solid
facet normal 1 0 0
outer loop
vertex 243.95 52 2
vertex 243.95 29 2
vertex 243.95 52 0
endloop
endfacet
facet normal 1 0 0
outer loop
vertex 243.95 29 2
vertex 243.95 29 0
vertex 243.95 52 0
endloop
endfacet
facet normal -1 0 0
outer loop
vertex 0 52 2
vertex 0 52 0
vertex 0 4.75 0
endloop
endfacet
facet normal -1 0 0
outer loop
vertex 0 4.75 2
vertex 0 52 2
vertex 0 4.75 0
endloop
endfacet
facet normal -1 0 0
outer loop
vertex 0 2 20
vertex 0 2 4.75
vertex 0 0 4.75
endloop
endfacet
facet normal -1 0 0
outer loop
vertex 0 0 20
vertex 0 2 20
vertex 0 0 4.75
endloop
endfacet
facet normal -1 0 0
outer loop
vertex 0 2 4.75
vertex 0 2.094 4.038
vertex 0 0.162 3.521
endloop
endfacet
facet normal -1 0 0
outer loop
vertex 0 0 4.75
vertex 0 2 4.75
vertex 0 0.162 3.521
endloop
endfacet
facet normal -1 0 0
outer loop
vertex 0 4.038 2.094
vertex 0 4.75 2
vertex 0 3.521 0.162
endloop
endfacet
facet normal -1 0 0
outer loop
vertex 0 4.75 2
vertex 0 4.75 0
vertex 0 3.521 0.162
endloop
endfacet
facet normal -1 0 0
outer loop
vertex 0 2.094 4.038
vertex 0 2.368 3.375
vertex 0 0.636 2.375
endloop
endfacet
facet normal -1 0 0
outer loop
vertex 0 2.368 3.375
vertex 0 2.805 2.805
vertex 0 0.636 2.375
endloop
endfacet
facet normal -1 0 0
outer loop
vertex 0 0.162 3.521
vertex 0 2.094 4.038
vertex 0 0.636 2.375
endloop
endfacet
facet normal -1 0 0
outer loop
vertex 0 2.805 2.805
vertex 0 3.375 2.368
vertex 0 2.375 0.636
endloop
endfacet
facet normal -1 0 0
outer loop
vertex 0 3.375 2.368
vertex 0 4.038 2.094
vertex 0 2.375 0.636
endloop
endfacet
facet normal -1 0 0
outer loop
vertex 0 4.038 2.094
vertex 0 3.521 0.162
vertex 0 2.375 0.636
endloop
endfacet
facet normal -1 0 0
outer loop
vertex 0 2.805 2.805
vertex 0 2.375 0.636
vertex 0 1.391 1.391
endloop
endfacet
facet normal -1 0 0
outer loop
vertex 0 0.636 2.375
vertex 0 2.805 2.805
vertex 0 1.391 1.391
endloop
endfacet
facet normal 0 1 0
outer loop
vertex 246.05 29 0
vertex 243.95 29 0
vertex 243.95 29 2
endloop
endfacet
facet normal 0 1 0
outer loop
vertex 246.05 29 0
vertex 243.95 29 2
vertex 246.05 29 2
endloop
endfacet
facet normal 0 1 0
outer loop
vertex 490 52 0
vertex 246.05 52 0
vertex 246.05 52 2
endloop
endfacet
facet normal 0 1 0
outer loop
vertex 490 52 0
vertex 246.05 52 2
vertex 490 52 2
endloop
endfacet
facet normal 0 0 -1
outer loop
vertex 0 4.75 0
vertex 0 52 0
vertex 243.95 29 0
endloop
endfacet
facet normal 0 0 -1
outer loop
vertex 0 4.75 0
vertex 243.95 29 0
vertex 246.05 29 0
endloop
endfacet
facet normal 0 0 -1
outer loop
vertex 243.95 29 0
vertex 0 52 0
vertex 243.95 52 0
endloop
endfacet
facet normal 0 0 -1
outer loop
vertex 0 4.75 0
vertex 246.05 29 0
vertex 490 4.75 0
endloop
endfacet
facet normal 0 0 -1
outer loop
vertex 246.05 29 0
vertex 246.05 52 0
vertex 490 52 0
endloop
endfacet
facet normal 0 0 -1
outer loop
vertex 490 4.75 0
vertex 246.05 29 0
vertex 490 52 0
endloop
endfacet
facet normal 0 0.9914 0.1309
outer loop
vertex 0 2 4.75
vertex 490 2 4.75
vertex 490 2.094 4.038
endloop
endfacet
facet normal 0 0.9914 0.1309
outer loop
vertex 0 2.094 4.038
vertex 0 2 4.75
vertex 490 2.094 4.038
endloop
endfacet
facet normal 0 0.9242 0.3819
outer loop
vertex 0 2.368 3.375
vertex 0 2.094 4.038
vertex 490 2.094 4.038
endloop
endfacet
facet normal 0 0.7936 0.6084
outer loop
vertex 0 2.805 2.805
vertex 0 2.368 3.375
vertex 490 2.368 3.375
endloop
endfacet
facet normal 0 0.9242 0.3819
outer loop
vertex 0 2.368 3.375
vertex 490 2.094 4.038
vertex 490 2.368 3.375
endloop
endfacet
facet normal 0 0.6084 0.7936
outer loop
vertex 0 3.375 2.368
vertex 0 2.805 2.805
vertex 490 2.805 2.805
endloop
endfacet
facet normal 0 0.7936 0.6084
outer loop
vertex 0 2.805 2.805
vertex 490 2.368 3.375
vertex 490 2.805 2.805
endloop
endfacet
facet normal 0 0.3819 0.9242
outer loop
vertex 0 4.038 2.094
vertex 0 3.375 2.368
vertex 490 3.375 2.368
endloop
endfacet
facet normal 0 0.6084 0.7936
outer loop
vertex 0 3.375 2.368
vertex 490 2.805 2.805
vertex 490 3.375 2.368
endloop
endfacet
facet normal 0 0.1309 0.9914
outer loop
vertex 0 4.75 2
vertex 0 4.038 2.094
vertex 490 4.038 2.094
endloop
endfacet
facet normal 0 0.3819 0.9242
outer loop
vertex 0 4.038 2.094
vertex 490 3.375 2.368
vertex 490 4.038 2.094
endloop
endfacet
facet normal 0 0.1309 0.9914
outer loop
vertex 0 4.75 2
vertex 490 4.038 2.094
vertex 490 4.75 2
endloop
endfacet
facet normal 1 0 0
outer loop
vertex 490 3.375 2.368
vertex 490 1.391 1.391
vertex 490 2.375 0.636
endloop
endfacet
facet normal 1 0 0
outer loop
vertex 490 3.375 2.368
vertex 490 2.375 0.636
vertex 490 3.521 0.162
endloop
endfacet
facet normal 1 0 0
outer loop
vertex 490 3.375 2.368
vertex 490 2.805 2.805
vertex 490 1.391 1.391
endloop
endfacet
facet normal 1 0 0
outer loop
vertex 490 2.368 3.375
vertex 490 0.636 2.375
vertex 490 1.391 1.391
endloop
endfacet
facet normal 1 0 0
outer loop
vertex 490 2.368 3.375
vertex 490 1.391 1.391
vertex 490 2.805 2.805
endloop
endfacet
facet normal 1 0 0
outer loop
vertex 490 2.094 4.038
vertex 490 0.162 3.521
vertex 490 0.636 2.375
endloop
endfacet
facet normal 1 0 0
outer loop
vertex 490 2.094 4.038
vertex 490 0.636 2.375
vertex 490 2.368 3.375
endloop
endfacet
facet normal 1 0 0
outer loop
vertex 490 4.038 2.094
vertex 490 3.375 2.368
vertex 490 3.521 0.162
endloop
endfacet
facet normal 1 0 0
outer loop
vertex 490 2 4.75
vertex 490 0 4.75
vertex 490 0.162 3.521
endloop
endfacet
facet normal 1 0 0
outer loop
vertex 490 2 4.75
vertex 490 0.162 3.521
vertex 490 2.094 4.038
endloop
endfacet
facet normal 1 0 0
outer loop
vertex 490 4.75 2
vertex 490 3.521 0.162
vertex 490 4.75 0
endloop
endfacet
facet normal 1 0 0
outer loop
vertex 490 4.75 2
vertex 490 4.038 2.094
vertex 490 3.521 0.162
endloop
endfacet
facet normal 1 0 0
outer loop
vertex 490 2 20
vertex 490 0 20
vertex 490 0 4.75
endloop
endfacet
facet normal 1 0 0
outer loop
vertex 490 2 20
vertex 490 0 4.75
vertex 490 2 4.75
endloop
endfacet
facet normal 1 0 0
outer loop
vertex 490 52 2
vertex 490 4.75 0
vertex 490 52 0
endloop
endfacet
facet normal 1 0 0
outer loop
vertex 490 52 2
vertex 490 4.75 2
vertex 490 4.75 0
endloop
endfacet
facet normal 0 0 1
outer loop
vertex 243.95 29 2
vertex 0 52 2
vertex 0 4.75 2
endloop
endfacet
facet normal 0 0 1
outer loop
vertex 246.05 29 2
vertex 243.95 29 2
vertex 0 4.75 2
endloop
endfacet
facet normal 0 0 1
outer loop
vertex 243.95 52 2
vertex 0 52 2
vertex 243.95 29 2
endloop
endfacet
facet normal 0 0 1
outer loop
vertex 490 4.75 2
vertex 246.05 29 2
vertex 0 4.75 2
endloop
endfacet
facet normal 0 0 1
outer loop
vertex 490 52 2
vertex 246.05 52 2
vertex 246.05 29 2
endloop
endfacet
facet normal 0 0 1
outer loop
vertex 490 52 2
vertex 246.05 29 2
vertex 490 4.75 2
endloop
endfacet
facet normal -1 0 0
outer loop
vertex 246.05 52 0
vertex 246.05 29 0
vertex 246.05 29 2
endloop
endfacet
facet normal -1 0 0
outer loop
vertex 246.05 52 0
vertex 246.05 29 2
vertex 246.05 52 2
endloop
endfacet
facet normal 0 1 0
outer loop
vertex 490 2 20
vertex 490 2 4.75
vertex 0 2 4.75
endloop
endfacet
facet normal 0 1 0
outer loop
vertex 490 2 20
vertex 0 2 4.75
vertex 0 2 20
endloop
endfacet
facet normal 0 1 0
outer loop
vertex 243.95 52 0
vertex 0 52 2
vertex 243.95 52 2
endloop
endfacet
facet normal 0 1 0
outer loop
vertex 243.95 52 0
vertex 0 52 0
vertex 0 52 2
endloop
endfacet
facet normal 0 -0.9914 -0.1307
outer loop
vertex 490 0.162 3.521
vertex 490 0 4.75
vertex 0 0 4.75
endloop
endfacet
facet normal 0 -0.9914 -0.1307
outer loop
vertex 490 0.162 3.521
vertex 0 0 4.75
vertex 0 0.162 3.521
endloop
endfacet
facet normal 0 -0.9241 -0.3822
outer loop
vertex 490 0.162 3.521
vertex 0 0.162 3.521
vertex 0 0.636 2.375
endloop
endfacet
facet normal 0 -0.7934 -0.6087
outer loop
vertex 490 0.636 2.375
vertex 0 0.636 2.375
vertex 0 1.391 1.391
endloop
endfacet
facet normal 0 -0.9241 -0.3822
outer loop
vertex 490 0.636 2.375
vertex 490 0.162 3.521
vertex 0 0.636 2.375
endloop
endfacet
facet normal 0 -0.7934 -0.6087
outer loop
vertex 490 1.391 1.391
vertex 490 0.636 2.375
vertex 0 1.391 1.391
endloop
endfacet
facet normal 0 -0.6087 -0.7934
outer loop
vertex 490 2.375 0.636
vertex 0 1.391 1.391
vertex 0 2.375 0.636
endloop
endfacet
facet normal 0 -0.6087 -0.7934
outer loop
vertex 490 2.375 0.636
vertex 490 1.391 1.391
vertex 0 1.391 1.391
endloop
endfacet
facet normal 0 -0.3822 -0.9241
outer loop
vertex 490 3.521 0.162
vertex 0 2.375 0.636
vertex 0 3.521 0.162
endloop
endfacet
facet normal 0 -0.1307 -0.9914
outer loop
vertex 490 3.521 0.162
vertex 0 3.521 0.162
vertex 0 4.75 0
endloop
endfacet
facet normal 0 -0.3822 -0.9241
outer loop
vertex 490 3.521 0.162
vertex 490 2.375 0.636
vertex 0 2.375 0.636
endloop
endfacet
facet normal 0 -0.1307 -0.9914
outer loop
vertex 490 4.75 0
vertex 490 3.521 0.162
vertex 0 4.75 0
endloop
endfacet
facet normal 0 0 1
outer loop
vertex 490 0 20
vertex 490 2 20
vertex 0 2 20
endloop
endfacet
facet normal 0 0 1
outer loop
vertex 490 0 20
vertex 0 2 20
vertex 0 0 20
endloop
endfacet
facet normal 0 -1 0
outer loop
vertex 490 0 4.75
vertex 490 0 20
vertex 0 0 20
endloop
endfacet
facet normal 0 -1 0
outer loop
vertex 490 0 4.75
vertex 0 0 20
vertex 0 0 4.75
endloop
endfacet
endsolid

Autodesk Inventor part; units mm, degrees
ref_plane "YZ Plane" through (0, 0, 0) normal (1, 0, 0) x (0, 1, 0)
ref_plane "XZ Plane" through (0, 0, 0) normal (0, 1, 0) x (-1, 0, 0)
ref_plane "XY Plane" through (0, 0, 0) normal (0, 0, 1) x (1, 0, 0)
sketch "Sketch1" plane through (0, 0, 0) normal (0, 0, 1) x (1, 0, 0)
  line L0 (-490, 52) -> (490, 52)
  line L1 (490, 52) -> (490, 0)
  line L2 (490, 0) -> (-490, 0)
  line L3 (-490, 0) -> (-490, 52)
  point P0 (0, 0)
  point P1 (0, 0)
  dimension "d0" = 980
  dimension "d1" = 52
extrude "Plate1" add sketch "Sketch1" along normal blind 2
sketch "Sketch2" plane through (490, 2, 0) normal (0, -1, 0) x (1, 0, 0)
  line L0 (-980, 0) -> (0, 0)
  line L1 (0, 0) -> (0, 20)
  line L2 (0, 20) -> (-980, 20)
  line L3 (-980, 20) -> (-980, 0)
edge flange "Flange1" height 20 angle 90 thickness 2 bend radius 2.75 thickness toward (0, -1, 0) relief round relief width 2 relief depth 1 edges at (0, 0, 2) wall of the first edge with corners at (-490, 2, 0) (490, 2, 0) (490, 2, 20) (-490, 2, 20)
bend "Bend1"
corner "Corner1"
sketch "Sketch11" plane through (0, 0, 0) normal (0, 0, 1) x (1, 0, 0)
  line L0 (-490, 52) -> (490, 52) projected
  circle A0 centre (0, 52) radius 30
  line L1 (-490, 0) -> (490, 0) projected
  line L2 (246.05, 0) -> (243.95, 0)
  line L3 (243.95, 0) -> (243.95, 29)
  line L4 (243.95, 29) -> (246.05, 29)
  line L5 (246.05, 29) -> (246.05, 0)
  line L6 (-243.95, 0) -> (-246.05, 0)
  line L7 (-246.05, 0) -> (-246.05, 29) construction
  line L8 (-246.05, 29) -> (-243.95, 29) construction
  line L9 (-243.95, 29) -> (-243.95, 0) construction
  line L10 (0, 52) -> (0, 0)
  line L11 (246.05, 29) -> (246.05, 52)
  line L12 (243.95, 29) -> (243.95, 52)
  line L13 (-243.95, 29) -> (-243.95, 52) construction
  line L14 (-246.05, 29) -> (-246.05, 52) construction
  line L15 (-490, 0) -> (-490, 52)
  circle A1 centre (490, 52) radius 30
  line L16 (490, 52) -> (490, 0)
  point P0 (30, 52)
  point P1 (-30, 52)
  point P2 (-245, 29)
  point P3 (245, 29)
  point P4 (490, 22)
  point P5 (460, 52)
  point P6 (0, 22)
  dimension "d44" = 60
  dimension "d47" = 2.1
  dimension "d49" = 490
  dimension "d50" = 29
extrude "Extrusion4" cut sketch "Sketch11" along normal through all both and the other way through all contours L10 A0 L0 | A0 L10 L1 L15 L0 | L0 L11 L4 L12 picked at (-19.7493, 49.7748)
sketch "Sketch9" plane through (0, 0, 2) normal (0, 0, 1) x (1, 0, 0)
  line L0 (456.3279, 23.6801) -> (456.3279, 11.6801) construction
  line L1 (456.3279, 11.6801) -> (256.3279, 11.6801) construction
  line L2 (256.3279, 11.6801) -> (256.3279, 23.6801) construction
  line L3 (256.3279, 23.6801) -> (456.3279, 23.6801) construction
  line L4 (-490, 52) -> (490, 52) projected
  point P0 (0, 0)
  point P1 (1, 52)
  dimension "d38" = 200
  dimension "d39" = 12
mark "Mark3"
equation "\"d1\" = СПИНА_Стрингер_1_высота"
equation "\"d2\" = Thickness"
equation "\"d3\" = BendReliefWidth"
equation "\"d4\" = BendReliefDepth"
equation "\"d5\" = MinimumRemnant"
equation "\"d6\" = TransitionRadius"
equation "\"d9\" = BendRadius"
equation "\"d10\" = CornerReliefSize"
equation "\"d11\" = GapSize"
equation "\"d12\" = JacobiRadiusSize"
equation "\"BendReliefWidth\" = Thickness"
equation "\"BendReliefDepth\" = 0.5 * Thickness"
equation "\"CornerReliefSize\" = 4 * Thickness"
equation "\"MinimumRemnant\" = 2 * Thickness"
equation "\"TransitionRadius\" = BendRadius"
equation "\"JacobiRadiusSize\" = BendRadius"
equation "\"GapSize\" = Thickness"
equation "\"СПИНА_Стрингер_1_высота\" = 52"
equation "\"Thickness\" = 2"
equation "\"BendRadius\" = 2.75"
properties part number "MSC 204 stringer back ^" material "Stainless Steel"
